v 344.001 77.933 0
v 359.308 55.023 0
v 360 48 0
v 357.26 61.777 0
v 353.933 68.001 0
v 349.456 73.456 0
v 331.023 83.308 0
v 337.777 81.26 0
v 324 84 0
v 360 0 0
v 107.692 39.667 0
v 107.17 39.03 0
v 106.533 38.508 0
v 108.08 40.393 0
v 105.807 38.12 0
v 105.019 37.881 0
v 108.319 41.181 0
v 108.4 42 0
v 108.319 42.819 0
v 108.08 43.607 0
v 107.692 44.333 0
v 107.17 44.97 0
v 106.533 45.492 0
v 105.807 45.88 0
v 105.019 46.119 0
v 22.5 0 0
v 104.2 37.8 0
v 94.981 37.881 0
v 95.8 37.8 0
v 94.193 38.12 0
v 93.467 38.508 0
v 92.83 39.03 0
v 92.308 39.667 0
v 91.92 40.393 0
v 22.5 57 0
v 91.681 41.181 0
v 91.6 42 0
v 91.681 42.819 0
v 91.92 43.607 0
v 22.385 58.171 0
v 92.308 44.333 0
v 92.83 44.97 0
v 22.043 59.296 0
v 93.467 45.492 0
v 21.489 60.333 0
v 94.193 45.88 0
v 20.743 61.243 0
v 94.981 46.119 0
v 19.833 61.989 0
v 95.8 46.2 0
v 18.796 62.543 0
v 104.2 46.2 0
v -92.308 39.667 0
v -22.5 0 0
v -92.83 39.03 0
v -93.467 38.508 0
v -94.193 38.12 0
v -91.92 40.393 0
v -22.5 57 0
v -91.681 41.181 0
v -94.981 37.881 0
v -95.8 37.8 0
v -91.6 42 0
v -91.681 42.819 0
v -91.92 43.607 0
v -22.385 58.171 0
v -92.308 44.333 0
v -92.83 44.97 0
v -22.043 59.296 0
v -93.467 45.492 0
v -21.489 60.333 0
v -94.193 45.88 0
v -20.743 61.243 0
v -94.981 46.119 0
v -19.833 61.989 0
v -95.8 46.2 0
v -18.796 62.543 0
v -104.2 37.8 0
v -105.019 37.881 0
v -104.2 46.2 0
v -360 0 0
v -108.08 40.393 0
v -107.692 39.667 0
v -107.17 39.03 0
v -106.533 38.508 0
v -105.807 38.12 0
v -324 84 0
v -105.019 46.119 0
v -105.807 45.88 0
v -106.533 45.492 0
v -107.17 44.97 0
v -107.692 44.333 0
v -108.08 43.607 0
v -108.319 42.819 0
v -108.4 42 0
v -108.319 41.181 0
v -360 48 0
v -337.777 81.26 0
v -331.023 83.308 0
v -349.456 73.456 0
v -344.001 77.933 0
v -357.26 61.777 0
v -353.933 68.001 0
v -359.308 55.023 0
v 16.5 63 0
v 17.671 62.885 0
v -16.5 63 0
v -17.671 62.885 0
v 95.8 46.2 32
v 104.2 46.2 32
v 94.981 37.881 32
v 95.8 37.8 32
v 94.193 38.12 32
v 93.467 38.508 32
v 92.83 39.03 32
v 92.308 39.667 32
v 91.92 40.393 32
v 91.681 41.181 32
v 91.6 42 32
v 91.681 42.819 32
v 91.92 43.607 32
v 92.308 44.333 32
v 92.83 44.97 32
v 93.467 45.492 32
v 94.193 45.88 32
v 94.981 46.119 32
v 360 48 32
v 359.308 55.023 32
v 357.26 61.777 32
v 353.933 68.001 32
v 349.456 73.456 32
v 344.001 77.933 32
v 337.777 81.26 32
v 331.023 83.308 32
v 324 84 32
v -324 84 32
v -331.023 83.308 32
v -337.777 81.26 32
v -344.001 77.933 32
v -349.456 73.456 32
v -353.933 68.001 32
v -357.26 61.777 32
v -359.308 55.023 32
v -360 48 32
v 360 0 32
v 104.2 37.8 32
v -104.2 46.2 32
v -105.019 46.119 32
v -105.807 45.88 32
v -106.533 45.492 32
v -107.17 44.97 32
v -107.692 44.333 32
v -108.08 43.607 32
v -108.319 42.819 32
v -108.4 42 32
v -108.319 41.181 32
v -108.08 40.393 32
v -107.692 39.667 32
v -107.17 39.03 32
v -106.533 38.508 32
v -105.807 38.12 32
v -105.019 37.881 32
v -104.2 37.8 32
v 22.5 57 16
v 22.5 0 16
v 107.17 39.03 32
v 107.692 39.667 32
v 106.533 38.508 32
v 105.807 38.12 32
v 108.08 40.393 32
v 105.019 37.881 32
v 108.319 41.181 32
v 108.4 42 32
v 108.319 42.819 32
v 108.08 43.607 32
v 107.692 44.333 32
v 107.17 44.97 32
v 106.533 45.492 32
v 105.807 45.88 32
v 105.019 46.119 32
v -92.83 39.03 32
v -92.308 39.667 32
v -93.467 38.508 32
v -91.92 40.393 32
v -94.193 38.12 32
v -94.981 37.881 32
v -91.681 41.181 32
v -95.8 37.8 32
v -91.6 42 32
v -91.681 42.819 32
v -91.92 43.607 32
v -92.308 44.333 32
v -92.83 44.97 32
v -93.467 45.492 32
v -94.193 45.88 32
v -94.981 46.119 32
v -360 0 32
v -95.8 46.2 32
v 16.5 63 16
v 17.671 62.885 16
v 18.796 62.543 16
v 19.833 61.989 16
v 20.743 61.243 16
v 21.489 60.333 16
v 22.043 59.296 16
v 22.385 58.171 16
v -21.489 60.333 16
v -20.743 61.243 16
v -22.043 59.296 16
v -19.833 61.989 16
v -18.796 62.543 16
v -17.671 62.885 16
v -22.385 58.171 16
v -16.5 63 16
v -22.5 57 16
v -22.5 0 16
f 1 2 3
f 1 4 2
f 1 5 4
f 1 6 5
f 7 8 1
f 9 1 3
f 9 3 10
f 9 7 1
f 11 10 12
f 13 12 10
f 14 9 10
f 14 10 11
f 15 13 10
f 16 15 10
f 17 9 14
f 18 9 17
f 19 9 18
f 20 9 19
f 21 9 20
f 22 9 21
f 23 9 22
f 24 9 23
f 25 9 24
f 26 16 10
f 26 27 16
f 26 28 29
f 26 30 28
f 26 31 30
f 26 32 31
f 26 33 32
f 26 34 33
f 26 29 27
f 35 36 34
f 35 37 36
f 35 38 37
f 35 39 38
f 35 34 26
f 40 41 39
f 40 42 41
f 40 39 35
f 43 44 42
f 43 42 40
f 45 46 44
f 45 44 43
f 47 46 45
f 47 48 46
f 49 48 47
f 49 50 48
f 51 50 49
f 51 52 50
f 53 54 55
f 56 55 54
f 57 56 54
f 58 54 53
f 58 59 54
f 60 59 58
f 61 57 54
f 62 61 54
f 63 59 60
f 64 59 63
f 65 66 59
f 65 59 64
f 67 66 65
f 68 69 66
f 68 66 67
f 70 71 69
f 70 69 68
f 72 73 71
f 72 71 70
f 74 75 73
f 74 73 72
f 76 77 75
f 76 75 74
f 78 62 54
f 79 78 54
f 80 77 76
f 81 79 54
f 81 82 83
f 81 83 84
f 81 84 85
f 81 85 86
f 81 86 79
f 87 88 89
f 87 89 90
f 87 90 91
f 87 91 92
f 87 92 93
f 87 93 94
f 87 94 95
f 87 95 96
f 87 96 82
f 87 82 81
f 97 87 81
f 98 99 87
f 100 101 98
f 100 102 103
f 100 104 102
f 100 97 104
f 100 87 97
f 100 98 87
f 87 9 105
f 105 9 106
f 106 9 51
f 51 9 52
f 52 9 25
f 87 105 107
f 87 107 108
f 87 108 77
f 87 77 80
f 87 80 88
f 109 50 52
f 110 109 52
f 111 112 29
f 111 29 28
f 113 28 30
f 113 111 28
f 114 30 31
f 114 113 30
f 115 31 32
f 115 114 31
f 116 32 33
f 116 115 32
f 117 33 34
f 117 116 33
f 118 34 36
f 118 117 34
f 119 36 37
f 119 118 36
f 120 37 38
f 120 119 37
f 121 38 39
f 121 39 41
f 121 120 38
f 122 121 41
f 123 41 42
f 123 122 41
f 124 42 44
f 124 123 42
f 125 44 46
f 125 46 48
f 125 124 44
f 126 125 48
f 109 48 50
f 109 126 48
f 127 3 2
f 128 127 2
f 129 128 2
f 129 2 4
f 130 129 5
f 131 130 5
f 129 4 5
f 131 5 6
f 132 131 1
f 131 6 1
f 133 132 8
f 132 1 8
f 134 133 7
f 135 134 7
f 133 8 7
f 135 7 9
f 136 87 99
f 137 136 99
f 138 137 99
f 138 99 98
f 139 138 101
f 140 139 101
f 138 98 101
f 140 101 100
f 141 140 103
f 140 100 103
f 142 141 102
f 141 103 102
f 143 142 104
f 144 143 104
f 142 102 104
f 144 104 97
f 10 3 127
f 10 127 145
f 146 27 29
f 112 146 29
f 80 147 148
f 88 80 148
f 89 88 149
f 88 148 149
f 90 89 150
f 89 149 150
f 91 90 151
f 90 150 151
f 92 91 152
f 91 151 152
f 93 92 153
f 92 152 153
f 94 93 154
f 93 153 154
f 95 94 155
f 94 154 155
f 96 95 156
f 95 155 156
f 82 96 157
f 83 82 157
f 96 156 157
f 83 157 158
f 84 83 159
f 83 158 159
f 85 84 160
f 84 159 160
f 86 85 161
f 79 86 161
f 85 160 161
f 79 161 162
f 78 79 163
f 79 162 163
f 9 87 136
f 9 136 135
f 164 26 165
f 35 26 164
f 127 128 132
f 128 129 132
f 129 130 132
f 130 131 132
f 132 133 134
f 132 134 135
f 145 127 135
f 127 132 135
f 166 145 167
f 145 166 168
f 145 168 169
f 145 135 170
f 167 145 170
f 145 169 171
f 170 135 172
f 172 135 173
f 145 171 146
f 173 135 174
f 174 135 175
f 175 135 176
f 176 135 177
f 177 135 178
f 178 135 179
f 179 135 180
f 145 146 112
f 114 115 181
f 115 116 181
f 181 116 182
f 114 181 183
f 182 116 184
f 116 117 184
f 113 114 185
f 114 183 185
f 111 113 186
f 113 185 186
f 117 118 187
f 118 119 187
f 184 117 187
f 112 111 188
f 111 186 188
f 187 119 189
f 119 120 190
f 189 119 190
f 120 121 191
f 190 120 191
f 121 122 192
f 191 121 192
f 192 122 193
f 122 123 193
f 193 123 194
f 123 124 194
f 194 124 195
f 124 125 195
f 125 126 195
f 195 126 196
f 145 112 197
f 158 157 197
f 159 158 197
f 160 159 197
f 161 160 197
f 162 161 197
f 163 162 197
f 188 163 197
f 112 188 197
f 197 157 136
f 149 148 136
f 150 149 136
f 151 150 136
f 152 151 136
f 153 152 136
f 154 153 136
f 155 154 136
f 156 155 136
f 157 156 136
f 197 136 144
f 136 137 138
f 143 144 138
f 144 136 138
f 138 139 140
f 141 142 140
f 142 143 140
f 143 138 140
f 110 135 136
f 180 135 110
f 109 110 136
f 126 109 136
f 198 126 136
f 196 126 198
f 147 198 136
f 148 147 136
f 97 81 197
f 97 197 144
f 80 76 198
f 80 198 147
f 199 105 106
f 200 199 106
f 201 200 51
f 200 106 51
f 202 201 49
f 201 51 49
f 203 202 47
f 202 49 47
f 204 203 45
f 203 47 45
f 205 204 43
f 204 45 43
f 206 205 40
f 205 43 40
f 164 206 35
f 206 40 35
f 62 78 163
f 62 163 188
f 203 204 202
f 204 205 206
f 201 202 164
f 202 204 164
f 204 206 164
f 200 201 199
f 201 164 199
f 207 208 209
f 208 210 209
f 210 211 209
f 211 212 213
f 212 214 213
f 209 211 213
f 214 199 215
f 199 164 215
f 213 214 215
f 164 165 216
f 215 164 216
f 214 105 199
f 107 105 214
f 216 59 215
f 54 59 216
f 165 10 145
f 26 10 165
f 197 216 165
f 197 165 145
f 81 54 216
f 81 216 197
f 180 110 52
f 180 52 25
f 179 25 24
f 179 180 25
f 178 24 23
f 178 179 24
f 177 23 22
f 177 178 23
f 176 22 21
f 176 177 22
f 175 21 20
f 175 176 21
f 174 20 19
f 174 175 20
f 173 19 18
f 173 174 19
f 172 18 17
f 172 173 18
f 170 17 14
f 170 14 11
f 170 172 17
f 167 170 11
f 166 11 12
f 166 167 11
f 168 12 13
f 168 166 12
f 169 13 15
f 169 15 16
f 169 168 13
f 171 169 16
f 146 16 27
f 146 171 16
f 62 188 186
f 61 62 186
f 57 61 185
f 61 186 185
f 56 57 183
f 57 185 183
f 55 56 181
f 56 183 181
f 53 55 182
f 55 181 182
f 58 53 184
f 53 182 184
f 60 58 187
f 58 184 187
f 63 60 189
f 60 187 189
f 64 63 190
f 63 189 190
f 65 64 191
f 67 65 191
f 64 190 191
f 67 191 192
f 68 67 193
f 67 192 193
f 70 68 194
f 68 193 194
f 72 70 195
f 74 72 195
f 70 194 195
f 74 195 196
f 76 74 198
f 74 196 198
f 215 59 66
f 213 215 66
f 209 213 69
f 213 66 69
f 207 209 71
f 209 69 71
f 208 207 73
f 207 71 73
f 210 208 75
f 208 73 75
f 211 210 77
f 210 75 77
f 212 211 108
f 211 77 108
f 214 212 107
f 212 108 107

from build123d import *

# Parameters (mm, degrees)
PAD004_DEPTH    = 32
POCKET005_DEPTH = 32
POCKET006_DEPTH = 16


with BuildPart() as part:
    # Sketch009 → Pad004 (new body)
    with BuildSketch(Plane.XY):
        with BuildLine():
            Line((-324, 84), (324, 84))
            ThreePointArc((360, 48), (349.455844, 73.455844), (324, 84))
            Line((360, 48), (360, 0))
            Line((360, 0), (-360, 0))
            Line((-360, 0), (-360, 48))
            ThreePointArc((-324, 84), (-349.455844, 73.455844), (-360, 48))
        make_face()
    extrude(amount=PAD004_DEPTH)

    # Sketch010 → Pocket005 (cut)
    with BuildSketch(Plane.XY.offset(32)):
        with BuildLine():
            ThreePointArc((-104.2, 46.2), (-108.4, 42), (-104.2, 37.8))
            Line((-104.2, 37.8), (-95.8, 37.8))
            ThreePointArc((-95.8, 37.8), (-91.6, 42), (-95.8, 46.2))
            Line((-95.8, 46.2), (-104.2, 46.2))
        make_face()
    pocket005 = extrude(amount=-POCKET005_DEPTH, mode=Mode.SUBTRACT)

    # Mirrored: Pocket005 across Sketch010 V_Axis
    add(pocket005.mirror(Plane(origin=(0, 0, 32), x_dir=(0, 0, 1), z_dir=(1, 0, 0))), mode=Mode.SUBTRACT)

    # Sketch011 → Pocket006 (cut)
    with BuildSketch(Plane(origin=(0, 0, 0), x_dir=(1, 0, 0), z_dir=(0, 0, -1))):
        with BuildLine():
            Line((-22.5, 0), (22.5, 0))
            Line((22.5, 0), (22.5, -57))
            ThreePointArc((16.5, -63), (20.742641, -61.242641), (22.5, -57))
            Line((16.5, -63), (-16.5, -63))
            ThreePointArc((-22.5, -57), (-20.742641, -61.242641), (-16.5, -63))
            Line((-22.5, -57), (-22.5, 0))
        make_face()
    extrude(amount=-POCKET006_DEPTH, mode=Mode.SUBTRACT)


solid = part.part
